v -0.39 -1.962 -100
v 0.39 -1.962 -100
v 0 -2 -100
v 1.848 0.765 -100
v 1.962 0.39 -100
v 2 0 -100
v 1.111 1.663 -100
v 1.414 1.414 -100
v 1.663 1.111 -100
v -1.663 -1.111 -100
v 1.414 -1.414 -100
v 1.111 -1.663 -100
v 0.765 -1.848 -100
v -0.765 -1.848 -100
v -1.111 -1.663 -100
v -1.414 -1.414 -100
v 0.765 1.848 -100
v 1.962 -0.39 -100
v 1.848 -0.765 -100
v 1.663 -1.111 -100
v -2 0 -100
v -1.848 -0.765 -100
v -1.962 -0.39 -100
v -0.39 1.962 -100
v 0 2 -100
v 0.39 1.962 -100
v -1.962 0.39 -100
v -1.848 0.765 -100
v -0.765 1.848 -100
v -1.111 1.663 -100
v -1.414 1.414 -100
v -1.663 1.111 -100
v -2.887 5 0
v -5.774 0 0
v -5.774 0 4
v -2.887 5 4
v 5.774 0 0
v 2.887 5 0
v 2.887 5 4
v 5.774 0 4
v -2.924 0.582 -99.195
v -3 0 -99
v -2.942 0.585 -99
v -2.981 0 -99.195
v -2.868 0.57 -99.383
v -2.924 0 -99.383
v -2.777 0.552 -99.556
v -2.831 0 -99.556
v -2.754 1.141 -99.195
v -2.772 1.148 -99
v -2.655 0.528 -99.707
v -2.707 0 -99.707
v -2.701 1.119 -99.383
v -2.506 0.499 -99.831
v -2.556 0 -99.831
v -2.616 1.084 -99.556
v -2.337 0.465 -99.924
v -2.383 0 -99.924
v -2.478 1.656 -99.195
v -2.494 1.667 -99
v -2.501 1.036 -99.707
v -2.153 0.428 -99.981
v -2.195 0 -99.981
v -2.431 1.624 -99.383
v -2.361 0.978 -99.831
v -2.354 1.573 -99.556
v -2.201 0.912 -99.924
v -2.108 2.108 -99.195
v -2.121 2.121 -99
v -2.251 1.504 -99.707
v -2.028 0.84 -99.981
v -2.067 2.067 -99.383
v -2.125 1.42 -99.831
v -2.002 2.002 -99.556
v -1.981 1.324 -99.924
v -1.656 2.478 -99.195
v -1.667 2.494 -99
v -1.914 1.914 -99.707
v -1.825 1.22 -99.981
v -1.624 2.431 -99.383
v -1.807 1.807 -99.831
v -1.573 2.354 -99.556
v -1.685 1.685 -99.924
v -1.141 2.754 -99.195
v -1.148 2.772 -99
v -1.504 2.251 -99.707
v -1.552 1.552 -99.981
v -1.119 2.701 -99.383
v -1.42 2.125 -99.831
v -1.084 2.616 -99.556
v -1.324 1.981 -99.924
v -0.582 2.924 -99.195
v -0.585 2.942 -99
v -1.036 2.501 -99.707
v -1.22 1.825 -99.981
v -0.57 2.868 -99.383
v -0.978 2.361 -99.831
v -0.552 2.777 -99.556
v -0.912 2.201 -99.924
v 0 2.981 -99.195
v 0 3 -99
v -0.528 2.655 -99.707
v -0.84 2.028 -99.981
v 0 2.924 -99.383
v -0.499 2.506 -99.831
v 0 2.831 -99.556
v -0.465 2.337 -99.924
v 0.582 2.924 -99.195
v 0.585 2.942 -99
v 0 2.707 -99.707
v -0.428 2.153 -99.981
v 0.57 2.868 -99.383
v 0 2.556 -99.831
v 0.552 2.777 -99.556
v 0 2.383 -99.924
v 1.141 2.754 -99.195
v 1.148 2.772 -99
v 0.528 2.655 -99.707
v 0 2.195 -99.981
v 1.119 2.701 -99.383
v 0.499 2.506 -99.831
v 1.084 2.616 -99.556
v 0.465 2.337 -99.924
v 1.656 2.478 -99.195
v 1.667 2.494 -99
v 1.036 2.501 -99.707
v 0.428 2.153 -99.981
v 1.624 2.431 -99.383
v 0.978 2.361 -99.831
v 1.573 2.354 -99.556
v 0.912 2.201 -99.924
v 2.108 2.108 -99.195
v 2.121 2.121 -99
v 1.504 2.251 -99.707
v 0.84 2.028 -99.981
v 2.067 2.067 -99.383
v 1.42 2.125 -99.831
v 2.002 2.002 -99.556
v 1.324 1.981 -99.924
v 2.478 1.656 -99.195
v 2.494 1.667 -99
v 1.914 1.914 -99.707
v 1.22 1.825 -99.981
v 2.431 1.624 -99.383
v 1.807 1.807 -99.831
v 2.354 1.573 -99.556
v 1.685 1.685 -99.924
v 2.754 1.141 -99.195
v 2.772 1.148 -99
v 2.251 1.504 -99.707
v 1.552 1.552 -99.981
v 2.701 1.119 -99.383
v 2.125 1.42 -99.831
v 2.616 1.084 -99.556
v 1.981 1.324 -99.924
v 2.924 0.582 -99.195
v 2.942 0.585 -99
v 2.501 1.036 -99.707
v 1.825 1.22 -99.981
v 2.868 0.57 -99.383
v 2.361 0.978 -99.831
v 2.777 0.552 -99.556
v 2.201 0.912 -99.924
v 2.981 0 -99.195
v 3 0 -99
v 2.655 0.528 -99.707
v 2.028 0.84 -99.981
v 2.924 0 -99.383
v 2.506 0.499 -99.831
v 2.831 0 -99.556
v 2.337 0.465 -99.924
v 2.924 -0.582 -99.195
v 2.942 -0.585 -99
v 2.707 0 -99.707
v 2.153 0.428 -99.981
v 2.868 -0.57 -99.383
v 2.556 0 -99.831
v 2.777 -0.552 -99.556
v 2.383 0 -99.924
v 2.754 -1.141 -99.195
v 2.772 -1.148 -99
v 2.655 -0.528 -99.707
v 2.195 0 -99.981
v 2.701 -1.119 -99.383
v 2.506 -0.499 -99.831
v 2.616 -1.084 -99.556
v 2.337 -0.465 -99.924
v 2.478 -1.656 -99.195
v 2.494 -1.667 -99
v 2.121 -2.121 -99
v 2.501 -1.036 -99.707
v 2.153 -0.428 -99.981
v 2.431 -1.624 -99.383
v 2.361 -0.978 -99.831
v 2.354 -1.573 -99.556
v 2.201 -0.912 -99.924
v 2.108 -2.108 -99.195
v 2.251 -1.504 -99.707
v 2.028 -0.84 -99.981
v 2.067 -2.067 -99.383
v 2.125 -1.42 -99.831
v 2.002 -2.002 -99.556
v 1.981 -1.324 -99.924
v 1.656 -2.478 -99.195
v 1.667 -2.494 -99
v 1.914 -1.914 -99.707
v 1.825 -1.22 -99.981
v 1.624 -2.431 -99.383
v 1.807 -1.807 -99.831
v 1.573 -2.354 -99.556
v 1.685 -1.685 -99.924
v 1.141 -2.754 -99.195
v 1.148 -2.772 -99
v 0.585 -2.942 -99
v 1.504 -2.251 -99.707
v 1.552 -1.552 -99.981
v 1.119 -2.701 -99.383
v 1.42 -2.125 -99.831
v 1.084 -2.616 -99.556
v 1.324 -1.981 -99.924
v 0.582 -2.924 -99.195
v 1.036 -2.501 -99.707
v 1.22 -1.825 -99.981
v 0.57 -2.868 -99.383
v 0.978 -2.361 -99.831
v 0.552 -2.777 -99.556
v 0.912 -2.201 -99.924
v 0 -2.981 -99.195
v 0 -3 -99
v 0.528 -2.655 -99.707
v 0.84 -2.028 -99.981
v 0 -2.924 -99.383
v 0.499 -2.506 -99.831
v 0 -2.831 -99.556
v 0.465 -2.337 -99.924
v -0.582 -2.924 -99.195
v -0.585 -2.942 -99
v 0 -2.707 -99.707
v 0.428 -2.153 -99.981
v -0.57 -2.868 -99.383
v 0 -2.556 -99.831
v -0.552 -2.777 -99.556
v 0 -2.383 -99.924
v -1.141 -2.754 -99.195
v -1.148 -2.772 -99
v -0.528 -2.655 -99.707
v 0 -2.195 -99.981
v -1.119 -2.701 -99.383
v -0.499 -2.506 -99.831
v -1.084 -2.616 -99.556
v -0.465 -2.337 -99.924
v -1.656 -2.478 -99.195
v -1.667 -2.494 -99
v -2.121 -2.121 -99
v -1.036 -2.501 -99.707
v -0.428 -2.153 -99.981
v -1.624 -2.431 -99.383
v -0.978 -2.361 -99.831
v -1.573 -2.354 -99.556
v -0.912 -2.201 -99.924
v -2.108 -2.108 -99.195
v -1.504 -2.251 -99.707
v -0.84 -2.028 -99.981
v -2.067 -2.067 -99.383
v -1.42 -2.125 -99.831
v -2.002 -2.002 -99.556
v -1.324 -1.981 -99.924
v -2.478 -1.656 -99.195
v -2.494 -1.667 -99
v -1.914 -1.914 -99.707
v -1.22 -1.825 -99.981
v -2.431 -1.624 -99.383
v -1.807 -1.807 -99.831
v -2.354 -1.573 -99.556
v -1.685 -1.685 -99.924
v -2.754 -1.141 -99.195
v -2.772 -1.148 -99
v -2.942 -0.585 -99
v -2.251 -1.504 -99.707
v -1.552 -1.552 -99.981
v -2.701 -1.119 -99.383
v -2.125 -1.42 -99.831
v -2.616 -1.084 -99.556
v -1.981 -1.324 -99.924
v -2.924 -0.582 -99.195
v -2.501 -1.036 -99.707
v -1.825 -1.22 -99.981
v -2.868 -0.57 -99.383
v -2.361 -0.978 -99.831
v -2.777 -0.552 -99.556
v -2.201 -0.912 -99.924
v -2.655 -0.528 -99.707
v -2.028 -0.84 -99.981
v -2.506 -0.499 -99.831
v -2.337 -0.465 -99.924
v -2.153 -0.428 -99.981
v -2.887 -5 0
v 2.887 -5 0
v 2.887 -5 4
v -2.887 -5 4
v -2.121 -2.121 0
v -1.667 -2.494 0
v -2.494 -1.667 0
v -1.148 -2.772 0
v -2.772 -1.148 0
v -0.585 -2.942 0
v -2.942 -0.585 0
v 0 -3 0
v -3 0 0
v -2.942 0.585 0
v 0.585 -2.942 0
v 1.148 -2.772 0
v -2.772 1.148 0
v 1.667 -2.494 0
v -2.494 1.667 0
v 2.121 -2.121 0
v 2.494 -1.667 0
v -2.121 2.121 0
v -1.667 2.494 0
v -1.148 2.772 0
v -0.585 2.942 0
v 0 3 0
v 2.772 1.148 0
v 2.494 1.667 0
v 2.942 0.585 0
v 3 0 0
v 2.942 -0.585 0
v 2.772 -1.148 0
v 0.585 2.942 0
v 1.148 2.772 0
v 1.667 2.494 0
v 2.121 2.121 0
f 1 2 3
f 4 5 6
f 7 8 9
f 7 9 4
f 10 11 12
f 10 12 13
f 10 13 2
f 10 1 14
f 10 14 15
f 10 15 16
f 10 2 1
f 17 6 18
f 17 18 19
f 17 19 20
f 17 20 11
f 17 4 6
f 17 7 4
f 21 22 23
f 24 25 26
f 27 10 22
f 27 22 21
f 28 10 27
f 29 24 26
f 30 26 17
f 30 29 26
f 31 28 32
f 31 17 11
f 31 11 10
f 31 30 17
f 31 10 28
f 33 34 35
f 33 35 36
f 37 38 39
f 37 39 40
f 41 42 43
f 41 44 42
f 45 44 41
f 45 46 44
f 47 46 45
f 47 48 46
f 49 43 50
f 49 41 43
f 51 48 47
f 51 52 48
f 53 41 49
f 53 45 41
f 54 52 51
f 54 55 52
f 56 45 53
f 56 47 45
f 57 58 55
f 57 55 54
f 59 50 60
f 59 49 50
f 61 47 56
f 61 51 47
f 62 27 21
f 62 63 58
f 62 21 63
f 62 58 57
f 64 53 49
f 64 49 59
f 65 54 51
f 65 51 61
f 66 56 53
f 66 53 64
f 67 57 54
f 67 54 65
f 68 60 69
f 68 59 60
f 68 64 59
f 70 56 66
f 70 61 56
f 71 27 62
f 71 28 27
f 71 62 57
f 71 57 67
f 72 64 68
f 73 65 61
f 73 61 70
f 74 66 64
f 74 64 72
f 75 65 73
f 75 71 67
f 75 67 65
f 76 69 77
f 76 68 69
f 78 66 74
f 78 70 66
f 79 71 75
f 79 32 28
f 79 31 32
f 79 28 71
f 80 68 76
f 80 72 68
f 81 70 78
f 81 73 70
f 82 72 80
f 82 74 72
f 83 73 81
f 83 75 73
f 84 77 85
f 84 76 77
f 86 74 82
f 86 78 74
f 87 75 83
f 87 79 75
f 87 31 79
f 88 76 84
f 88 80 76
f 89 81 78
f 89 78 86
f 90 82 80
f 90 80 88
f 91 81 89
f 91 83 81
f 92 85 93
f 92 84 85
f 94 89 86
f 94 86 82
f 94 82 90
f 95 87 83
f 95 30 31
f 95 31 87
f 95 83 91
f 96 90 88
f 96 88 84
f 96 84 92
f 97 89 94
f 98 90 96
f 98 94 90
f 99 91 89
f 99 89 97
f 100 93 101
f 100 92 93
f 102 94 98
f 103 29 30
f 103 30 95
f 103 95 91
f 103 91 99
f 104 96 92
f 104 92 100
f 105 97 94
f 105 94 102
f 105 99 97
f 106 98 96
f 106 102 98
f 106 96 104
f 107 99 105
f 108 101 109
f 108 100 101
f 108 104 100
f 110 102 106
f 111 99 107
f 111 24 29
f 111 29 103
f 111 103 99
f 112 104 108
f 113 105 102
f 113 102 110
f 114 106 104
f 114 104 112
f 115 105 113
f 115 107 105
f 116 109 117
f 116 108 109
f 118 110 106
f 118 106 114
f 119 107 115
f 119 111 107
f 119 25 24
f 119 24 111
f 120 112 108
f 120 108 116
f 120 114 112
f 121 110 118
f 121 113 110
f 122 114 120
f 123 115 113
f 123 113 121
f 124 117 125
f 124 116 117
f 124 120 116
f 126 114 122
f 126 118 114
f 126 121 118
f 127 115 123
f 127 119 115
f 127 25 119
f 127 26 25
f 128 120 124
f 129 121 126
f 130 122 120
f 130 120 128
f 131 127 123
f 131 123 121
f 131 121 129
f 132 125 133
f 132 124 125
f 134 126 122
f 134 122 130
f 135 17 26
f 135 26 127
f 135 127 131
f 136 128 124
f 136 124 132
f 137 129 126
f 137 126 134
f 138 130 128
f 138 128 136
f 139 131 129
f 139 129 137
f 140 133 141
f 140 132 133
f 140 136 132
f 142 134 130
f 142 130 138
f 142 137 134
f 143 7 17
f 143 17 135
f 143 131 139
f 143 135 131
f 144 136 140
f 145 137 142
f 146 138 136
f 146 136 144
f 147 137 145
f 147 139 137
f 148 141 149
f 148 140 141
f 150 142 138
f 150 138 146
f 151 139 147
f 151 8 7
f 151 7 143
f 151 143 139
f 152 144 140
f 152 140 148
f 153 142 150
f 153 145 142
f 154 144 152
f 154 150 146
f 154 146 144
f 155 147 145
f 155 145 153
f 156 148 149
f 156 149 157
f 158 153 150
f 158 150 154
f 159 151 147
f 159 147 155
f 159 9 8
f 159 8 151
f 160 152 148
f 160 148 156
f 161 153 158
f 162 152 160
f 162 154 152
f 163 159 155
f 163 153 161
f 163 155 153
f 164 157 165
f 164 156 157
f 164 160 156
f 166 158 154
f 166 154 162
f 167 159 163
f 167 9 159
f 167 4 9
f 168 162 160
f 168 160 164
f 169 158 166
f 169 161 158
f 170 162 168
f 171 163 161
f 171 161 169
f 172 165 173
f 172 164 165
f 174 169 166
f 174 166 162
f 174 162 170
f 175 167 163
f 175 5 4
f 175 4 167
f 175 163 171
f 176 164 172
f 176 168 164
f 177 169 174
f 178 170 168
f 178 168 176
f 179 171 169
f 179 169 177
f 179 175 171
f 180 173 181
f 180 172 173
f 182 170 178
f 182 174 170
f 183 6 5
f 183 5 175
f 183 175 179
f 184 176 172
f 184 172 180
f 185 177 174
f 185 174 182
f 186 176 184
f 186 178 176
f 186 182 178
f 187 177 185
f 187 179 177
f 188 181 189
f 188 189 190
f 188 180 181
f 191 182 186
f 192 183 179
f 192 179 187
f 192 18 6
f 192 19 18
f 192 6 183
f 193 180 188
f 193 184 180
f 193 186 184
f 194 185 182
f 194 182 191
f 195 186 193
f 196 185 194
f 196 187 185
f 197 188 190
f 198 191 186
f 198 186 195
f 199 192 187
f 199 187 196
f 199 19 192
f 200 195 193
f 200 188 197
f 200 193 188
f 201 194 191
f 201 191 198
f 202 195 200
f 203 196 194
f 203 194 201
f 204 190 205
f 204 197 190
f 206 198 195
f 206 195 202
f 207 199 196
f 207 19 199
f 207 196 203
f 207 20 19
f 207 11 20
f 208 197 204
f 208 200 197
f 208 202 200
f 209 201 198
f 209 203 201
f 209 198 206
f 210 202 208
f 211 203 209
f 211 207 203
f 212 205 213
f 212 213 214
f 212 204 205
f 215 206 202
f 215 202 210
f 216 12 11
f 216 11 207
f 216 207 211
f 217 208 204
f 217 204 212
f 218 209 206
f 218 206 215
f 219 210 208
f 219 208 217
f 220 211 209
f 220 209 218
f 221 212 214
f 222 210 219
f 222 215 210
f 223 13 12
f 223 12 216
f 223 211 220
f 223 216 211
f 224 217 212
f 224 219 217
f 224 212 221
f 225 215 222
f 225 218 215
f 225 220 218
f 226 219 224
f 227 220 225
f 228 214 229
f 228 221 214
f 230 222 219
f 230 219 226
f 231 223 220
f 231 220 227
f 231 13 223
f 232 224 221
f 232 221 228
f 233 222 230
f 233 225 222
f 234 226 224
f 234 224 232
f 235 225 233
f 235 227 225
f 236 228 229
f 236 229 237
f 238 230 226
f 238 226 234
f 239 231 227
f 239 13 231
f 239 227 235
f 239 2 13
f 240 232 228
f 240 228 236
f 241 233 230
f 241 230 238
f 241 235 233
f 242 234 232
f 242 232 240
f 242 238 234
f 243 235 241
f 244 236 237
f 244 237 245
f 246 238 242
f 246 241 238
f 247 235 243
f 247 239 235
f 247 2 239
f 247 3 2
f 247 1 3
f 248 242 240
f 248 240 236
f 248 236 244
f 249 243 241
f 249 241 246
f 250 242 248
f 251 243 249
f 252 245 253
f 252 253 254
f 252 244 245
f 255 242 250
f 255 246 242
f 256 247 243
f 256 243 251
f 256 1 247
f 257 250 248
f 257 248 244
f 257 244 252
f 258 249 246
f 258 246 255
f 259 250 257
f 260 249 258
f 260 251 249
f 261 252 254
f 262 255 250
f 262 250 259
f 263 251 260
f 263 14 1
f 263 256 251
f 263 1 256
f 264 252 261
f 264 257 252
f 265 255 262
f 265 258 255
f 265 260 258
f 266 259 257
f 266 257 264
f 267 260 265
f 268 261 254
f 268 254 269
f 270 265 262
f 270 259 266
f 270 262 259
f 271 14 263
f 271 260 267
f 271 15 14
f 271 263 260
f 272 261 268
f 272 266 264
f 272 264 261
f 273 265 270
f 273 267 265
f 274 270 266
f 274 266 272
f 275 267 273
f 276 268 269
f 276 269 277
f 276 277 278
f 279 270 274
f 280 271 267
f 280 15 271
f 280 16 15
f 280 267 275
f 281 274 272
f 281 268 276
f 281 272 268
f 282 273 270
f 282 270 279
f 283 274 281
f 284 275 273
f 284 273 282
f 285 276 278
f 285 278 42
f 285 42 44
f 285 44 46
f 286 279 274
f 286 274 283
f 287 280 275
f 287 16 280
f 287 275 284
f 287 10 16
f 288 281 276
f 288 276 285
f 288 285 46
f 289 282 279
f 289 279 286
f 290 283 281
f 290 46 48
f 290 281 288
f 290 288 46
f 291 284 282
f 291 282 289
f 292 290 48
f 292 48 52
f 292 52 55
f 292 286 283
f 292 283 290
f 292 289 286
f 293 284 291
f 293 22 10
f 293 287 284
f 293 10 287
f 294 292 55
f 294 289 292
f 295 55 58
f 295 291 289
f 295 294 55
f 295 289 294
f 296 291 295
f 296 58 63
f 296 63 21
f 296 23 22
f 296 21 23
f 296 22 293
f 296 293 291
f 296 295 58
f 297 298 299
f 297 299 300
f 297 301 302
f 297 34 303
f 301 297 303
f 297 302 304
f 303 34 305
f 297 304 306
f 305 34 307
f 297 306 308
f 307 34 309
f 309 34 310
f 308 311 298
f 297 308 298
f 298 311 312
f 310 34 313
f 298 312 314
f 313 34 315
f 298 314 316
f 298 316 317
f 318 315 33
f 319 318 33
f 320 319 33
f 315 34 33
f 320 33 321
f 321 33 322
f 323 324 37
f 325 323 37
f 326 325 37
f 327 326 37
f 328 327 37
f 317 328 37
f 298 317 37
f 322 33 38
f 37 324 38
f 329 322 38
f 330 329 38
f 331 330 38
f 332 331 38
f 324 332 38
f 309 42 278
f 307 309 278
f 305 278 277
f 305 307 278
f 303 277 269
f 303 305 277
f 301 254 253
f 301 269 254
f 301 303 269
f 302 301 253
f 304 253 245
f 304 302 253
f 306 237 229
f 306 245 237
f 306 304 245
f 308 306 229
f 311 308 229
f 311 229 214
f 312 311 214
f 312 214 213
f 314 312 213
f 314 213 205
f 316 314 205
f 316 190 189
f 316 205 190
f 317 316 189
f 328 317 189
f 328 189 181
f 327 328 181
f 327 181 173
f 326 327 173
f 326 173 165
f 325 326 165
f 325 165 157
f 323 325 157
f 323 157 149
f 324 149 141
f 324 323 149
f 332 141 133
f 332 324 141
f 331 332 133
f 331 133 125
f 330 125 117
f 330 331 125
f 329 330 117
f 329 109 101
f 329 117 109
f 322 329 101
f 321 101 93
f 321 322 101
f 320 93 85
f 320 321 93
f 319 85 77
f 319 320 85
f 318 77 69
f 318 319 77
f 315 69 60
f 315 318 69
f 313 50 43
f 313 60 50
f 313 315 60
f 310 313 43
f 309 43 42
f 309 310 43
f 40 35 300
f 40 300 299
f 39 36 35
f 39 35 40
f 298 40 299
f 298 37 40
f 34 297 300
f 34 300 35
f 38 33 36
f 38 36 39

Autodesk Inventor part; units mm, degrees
ref_plane "YZ Plane" through (0, 0, 0) normal (1, 0, 0) x (0, 1, 0)
ref_plane "XZ Plane" through (0, 0, 0) normal (0, 1, 0) x (-1, 0, 0)
ref_plane "XY Plane" through (0, 0, 0) normal (0, 0, 1) x (1, 0, 0)
sketch "Schizzo1" plane through (0, 0, 0) normal (0, 0, 1) x (1, 0, 0)
  circle A0 centre (0, 0) radius 5
  line L0 (2.8868, 5) -> (5.7735, 0)
  line L1 (5.7735, 0) -> (2.8868, -5)
  line L2 (2.8868, -5) -> (-2.8868, -5)
  line L3 (-2.8868, -5) -> (-5.7735, 0)
  line L4 (-5.7735, 0) -> (-2.8868, 5)
  line L5 (-2.8868, 5) -> (2.8868, 5)
  point P0 (0, 5)
  dimension "d0" = 10
extrude "Estrusione1" add sketch "Schizzo1" along normal blind 4
sketch "Schizzo3" plane through (0, 0, 0) normal (0, 0, -1) x (-1, 0, 0)
  circle A0 centre (0, 0) radius 3
  dimension "d3" = 6
extrude "Estrusione2" add sketch "Schizzo3" along normal blind 100
thread "Filettatura1" size "M6x1" class "6g" standard "ANSI Metric M Profile" full length
fillet "Raccordo1" radius 1 1 edges at (3, 0, -100)
properties part number "18_Vite_M6_L100"
